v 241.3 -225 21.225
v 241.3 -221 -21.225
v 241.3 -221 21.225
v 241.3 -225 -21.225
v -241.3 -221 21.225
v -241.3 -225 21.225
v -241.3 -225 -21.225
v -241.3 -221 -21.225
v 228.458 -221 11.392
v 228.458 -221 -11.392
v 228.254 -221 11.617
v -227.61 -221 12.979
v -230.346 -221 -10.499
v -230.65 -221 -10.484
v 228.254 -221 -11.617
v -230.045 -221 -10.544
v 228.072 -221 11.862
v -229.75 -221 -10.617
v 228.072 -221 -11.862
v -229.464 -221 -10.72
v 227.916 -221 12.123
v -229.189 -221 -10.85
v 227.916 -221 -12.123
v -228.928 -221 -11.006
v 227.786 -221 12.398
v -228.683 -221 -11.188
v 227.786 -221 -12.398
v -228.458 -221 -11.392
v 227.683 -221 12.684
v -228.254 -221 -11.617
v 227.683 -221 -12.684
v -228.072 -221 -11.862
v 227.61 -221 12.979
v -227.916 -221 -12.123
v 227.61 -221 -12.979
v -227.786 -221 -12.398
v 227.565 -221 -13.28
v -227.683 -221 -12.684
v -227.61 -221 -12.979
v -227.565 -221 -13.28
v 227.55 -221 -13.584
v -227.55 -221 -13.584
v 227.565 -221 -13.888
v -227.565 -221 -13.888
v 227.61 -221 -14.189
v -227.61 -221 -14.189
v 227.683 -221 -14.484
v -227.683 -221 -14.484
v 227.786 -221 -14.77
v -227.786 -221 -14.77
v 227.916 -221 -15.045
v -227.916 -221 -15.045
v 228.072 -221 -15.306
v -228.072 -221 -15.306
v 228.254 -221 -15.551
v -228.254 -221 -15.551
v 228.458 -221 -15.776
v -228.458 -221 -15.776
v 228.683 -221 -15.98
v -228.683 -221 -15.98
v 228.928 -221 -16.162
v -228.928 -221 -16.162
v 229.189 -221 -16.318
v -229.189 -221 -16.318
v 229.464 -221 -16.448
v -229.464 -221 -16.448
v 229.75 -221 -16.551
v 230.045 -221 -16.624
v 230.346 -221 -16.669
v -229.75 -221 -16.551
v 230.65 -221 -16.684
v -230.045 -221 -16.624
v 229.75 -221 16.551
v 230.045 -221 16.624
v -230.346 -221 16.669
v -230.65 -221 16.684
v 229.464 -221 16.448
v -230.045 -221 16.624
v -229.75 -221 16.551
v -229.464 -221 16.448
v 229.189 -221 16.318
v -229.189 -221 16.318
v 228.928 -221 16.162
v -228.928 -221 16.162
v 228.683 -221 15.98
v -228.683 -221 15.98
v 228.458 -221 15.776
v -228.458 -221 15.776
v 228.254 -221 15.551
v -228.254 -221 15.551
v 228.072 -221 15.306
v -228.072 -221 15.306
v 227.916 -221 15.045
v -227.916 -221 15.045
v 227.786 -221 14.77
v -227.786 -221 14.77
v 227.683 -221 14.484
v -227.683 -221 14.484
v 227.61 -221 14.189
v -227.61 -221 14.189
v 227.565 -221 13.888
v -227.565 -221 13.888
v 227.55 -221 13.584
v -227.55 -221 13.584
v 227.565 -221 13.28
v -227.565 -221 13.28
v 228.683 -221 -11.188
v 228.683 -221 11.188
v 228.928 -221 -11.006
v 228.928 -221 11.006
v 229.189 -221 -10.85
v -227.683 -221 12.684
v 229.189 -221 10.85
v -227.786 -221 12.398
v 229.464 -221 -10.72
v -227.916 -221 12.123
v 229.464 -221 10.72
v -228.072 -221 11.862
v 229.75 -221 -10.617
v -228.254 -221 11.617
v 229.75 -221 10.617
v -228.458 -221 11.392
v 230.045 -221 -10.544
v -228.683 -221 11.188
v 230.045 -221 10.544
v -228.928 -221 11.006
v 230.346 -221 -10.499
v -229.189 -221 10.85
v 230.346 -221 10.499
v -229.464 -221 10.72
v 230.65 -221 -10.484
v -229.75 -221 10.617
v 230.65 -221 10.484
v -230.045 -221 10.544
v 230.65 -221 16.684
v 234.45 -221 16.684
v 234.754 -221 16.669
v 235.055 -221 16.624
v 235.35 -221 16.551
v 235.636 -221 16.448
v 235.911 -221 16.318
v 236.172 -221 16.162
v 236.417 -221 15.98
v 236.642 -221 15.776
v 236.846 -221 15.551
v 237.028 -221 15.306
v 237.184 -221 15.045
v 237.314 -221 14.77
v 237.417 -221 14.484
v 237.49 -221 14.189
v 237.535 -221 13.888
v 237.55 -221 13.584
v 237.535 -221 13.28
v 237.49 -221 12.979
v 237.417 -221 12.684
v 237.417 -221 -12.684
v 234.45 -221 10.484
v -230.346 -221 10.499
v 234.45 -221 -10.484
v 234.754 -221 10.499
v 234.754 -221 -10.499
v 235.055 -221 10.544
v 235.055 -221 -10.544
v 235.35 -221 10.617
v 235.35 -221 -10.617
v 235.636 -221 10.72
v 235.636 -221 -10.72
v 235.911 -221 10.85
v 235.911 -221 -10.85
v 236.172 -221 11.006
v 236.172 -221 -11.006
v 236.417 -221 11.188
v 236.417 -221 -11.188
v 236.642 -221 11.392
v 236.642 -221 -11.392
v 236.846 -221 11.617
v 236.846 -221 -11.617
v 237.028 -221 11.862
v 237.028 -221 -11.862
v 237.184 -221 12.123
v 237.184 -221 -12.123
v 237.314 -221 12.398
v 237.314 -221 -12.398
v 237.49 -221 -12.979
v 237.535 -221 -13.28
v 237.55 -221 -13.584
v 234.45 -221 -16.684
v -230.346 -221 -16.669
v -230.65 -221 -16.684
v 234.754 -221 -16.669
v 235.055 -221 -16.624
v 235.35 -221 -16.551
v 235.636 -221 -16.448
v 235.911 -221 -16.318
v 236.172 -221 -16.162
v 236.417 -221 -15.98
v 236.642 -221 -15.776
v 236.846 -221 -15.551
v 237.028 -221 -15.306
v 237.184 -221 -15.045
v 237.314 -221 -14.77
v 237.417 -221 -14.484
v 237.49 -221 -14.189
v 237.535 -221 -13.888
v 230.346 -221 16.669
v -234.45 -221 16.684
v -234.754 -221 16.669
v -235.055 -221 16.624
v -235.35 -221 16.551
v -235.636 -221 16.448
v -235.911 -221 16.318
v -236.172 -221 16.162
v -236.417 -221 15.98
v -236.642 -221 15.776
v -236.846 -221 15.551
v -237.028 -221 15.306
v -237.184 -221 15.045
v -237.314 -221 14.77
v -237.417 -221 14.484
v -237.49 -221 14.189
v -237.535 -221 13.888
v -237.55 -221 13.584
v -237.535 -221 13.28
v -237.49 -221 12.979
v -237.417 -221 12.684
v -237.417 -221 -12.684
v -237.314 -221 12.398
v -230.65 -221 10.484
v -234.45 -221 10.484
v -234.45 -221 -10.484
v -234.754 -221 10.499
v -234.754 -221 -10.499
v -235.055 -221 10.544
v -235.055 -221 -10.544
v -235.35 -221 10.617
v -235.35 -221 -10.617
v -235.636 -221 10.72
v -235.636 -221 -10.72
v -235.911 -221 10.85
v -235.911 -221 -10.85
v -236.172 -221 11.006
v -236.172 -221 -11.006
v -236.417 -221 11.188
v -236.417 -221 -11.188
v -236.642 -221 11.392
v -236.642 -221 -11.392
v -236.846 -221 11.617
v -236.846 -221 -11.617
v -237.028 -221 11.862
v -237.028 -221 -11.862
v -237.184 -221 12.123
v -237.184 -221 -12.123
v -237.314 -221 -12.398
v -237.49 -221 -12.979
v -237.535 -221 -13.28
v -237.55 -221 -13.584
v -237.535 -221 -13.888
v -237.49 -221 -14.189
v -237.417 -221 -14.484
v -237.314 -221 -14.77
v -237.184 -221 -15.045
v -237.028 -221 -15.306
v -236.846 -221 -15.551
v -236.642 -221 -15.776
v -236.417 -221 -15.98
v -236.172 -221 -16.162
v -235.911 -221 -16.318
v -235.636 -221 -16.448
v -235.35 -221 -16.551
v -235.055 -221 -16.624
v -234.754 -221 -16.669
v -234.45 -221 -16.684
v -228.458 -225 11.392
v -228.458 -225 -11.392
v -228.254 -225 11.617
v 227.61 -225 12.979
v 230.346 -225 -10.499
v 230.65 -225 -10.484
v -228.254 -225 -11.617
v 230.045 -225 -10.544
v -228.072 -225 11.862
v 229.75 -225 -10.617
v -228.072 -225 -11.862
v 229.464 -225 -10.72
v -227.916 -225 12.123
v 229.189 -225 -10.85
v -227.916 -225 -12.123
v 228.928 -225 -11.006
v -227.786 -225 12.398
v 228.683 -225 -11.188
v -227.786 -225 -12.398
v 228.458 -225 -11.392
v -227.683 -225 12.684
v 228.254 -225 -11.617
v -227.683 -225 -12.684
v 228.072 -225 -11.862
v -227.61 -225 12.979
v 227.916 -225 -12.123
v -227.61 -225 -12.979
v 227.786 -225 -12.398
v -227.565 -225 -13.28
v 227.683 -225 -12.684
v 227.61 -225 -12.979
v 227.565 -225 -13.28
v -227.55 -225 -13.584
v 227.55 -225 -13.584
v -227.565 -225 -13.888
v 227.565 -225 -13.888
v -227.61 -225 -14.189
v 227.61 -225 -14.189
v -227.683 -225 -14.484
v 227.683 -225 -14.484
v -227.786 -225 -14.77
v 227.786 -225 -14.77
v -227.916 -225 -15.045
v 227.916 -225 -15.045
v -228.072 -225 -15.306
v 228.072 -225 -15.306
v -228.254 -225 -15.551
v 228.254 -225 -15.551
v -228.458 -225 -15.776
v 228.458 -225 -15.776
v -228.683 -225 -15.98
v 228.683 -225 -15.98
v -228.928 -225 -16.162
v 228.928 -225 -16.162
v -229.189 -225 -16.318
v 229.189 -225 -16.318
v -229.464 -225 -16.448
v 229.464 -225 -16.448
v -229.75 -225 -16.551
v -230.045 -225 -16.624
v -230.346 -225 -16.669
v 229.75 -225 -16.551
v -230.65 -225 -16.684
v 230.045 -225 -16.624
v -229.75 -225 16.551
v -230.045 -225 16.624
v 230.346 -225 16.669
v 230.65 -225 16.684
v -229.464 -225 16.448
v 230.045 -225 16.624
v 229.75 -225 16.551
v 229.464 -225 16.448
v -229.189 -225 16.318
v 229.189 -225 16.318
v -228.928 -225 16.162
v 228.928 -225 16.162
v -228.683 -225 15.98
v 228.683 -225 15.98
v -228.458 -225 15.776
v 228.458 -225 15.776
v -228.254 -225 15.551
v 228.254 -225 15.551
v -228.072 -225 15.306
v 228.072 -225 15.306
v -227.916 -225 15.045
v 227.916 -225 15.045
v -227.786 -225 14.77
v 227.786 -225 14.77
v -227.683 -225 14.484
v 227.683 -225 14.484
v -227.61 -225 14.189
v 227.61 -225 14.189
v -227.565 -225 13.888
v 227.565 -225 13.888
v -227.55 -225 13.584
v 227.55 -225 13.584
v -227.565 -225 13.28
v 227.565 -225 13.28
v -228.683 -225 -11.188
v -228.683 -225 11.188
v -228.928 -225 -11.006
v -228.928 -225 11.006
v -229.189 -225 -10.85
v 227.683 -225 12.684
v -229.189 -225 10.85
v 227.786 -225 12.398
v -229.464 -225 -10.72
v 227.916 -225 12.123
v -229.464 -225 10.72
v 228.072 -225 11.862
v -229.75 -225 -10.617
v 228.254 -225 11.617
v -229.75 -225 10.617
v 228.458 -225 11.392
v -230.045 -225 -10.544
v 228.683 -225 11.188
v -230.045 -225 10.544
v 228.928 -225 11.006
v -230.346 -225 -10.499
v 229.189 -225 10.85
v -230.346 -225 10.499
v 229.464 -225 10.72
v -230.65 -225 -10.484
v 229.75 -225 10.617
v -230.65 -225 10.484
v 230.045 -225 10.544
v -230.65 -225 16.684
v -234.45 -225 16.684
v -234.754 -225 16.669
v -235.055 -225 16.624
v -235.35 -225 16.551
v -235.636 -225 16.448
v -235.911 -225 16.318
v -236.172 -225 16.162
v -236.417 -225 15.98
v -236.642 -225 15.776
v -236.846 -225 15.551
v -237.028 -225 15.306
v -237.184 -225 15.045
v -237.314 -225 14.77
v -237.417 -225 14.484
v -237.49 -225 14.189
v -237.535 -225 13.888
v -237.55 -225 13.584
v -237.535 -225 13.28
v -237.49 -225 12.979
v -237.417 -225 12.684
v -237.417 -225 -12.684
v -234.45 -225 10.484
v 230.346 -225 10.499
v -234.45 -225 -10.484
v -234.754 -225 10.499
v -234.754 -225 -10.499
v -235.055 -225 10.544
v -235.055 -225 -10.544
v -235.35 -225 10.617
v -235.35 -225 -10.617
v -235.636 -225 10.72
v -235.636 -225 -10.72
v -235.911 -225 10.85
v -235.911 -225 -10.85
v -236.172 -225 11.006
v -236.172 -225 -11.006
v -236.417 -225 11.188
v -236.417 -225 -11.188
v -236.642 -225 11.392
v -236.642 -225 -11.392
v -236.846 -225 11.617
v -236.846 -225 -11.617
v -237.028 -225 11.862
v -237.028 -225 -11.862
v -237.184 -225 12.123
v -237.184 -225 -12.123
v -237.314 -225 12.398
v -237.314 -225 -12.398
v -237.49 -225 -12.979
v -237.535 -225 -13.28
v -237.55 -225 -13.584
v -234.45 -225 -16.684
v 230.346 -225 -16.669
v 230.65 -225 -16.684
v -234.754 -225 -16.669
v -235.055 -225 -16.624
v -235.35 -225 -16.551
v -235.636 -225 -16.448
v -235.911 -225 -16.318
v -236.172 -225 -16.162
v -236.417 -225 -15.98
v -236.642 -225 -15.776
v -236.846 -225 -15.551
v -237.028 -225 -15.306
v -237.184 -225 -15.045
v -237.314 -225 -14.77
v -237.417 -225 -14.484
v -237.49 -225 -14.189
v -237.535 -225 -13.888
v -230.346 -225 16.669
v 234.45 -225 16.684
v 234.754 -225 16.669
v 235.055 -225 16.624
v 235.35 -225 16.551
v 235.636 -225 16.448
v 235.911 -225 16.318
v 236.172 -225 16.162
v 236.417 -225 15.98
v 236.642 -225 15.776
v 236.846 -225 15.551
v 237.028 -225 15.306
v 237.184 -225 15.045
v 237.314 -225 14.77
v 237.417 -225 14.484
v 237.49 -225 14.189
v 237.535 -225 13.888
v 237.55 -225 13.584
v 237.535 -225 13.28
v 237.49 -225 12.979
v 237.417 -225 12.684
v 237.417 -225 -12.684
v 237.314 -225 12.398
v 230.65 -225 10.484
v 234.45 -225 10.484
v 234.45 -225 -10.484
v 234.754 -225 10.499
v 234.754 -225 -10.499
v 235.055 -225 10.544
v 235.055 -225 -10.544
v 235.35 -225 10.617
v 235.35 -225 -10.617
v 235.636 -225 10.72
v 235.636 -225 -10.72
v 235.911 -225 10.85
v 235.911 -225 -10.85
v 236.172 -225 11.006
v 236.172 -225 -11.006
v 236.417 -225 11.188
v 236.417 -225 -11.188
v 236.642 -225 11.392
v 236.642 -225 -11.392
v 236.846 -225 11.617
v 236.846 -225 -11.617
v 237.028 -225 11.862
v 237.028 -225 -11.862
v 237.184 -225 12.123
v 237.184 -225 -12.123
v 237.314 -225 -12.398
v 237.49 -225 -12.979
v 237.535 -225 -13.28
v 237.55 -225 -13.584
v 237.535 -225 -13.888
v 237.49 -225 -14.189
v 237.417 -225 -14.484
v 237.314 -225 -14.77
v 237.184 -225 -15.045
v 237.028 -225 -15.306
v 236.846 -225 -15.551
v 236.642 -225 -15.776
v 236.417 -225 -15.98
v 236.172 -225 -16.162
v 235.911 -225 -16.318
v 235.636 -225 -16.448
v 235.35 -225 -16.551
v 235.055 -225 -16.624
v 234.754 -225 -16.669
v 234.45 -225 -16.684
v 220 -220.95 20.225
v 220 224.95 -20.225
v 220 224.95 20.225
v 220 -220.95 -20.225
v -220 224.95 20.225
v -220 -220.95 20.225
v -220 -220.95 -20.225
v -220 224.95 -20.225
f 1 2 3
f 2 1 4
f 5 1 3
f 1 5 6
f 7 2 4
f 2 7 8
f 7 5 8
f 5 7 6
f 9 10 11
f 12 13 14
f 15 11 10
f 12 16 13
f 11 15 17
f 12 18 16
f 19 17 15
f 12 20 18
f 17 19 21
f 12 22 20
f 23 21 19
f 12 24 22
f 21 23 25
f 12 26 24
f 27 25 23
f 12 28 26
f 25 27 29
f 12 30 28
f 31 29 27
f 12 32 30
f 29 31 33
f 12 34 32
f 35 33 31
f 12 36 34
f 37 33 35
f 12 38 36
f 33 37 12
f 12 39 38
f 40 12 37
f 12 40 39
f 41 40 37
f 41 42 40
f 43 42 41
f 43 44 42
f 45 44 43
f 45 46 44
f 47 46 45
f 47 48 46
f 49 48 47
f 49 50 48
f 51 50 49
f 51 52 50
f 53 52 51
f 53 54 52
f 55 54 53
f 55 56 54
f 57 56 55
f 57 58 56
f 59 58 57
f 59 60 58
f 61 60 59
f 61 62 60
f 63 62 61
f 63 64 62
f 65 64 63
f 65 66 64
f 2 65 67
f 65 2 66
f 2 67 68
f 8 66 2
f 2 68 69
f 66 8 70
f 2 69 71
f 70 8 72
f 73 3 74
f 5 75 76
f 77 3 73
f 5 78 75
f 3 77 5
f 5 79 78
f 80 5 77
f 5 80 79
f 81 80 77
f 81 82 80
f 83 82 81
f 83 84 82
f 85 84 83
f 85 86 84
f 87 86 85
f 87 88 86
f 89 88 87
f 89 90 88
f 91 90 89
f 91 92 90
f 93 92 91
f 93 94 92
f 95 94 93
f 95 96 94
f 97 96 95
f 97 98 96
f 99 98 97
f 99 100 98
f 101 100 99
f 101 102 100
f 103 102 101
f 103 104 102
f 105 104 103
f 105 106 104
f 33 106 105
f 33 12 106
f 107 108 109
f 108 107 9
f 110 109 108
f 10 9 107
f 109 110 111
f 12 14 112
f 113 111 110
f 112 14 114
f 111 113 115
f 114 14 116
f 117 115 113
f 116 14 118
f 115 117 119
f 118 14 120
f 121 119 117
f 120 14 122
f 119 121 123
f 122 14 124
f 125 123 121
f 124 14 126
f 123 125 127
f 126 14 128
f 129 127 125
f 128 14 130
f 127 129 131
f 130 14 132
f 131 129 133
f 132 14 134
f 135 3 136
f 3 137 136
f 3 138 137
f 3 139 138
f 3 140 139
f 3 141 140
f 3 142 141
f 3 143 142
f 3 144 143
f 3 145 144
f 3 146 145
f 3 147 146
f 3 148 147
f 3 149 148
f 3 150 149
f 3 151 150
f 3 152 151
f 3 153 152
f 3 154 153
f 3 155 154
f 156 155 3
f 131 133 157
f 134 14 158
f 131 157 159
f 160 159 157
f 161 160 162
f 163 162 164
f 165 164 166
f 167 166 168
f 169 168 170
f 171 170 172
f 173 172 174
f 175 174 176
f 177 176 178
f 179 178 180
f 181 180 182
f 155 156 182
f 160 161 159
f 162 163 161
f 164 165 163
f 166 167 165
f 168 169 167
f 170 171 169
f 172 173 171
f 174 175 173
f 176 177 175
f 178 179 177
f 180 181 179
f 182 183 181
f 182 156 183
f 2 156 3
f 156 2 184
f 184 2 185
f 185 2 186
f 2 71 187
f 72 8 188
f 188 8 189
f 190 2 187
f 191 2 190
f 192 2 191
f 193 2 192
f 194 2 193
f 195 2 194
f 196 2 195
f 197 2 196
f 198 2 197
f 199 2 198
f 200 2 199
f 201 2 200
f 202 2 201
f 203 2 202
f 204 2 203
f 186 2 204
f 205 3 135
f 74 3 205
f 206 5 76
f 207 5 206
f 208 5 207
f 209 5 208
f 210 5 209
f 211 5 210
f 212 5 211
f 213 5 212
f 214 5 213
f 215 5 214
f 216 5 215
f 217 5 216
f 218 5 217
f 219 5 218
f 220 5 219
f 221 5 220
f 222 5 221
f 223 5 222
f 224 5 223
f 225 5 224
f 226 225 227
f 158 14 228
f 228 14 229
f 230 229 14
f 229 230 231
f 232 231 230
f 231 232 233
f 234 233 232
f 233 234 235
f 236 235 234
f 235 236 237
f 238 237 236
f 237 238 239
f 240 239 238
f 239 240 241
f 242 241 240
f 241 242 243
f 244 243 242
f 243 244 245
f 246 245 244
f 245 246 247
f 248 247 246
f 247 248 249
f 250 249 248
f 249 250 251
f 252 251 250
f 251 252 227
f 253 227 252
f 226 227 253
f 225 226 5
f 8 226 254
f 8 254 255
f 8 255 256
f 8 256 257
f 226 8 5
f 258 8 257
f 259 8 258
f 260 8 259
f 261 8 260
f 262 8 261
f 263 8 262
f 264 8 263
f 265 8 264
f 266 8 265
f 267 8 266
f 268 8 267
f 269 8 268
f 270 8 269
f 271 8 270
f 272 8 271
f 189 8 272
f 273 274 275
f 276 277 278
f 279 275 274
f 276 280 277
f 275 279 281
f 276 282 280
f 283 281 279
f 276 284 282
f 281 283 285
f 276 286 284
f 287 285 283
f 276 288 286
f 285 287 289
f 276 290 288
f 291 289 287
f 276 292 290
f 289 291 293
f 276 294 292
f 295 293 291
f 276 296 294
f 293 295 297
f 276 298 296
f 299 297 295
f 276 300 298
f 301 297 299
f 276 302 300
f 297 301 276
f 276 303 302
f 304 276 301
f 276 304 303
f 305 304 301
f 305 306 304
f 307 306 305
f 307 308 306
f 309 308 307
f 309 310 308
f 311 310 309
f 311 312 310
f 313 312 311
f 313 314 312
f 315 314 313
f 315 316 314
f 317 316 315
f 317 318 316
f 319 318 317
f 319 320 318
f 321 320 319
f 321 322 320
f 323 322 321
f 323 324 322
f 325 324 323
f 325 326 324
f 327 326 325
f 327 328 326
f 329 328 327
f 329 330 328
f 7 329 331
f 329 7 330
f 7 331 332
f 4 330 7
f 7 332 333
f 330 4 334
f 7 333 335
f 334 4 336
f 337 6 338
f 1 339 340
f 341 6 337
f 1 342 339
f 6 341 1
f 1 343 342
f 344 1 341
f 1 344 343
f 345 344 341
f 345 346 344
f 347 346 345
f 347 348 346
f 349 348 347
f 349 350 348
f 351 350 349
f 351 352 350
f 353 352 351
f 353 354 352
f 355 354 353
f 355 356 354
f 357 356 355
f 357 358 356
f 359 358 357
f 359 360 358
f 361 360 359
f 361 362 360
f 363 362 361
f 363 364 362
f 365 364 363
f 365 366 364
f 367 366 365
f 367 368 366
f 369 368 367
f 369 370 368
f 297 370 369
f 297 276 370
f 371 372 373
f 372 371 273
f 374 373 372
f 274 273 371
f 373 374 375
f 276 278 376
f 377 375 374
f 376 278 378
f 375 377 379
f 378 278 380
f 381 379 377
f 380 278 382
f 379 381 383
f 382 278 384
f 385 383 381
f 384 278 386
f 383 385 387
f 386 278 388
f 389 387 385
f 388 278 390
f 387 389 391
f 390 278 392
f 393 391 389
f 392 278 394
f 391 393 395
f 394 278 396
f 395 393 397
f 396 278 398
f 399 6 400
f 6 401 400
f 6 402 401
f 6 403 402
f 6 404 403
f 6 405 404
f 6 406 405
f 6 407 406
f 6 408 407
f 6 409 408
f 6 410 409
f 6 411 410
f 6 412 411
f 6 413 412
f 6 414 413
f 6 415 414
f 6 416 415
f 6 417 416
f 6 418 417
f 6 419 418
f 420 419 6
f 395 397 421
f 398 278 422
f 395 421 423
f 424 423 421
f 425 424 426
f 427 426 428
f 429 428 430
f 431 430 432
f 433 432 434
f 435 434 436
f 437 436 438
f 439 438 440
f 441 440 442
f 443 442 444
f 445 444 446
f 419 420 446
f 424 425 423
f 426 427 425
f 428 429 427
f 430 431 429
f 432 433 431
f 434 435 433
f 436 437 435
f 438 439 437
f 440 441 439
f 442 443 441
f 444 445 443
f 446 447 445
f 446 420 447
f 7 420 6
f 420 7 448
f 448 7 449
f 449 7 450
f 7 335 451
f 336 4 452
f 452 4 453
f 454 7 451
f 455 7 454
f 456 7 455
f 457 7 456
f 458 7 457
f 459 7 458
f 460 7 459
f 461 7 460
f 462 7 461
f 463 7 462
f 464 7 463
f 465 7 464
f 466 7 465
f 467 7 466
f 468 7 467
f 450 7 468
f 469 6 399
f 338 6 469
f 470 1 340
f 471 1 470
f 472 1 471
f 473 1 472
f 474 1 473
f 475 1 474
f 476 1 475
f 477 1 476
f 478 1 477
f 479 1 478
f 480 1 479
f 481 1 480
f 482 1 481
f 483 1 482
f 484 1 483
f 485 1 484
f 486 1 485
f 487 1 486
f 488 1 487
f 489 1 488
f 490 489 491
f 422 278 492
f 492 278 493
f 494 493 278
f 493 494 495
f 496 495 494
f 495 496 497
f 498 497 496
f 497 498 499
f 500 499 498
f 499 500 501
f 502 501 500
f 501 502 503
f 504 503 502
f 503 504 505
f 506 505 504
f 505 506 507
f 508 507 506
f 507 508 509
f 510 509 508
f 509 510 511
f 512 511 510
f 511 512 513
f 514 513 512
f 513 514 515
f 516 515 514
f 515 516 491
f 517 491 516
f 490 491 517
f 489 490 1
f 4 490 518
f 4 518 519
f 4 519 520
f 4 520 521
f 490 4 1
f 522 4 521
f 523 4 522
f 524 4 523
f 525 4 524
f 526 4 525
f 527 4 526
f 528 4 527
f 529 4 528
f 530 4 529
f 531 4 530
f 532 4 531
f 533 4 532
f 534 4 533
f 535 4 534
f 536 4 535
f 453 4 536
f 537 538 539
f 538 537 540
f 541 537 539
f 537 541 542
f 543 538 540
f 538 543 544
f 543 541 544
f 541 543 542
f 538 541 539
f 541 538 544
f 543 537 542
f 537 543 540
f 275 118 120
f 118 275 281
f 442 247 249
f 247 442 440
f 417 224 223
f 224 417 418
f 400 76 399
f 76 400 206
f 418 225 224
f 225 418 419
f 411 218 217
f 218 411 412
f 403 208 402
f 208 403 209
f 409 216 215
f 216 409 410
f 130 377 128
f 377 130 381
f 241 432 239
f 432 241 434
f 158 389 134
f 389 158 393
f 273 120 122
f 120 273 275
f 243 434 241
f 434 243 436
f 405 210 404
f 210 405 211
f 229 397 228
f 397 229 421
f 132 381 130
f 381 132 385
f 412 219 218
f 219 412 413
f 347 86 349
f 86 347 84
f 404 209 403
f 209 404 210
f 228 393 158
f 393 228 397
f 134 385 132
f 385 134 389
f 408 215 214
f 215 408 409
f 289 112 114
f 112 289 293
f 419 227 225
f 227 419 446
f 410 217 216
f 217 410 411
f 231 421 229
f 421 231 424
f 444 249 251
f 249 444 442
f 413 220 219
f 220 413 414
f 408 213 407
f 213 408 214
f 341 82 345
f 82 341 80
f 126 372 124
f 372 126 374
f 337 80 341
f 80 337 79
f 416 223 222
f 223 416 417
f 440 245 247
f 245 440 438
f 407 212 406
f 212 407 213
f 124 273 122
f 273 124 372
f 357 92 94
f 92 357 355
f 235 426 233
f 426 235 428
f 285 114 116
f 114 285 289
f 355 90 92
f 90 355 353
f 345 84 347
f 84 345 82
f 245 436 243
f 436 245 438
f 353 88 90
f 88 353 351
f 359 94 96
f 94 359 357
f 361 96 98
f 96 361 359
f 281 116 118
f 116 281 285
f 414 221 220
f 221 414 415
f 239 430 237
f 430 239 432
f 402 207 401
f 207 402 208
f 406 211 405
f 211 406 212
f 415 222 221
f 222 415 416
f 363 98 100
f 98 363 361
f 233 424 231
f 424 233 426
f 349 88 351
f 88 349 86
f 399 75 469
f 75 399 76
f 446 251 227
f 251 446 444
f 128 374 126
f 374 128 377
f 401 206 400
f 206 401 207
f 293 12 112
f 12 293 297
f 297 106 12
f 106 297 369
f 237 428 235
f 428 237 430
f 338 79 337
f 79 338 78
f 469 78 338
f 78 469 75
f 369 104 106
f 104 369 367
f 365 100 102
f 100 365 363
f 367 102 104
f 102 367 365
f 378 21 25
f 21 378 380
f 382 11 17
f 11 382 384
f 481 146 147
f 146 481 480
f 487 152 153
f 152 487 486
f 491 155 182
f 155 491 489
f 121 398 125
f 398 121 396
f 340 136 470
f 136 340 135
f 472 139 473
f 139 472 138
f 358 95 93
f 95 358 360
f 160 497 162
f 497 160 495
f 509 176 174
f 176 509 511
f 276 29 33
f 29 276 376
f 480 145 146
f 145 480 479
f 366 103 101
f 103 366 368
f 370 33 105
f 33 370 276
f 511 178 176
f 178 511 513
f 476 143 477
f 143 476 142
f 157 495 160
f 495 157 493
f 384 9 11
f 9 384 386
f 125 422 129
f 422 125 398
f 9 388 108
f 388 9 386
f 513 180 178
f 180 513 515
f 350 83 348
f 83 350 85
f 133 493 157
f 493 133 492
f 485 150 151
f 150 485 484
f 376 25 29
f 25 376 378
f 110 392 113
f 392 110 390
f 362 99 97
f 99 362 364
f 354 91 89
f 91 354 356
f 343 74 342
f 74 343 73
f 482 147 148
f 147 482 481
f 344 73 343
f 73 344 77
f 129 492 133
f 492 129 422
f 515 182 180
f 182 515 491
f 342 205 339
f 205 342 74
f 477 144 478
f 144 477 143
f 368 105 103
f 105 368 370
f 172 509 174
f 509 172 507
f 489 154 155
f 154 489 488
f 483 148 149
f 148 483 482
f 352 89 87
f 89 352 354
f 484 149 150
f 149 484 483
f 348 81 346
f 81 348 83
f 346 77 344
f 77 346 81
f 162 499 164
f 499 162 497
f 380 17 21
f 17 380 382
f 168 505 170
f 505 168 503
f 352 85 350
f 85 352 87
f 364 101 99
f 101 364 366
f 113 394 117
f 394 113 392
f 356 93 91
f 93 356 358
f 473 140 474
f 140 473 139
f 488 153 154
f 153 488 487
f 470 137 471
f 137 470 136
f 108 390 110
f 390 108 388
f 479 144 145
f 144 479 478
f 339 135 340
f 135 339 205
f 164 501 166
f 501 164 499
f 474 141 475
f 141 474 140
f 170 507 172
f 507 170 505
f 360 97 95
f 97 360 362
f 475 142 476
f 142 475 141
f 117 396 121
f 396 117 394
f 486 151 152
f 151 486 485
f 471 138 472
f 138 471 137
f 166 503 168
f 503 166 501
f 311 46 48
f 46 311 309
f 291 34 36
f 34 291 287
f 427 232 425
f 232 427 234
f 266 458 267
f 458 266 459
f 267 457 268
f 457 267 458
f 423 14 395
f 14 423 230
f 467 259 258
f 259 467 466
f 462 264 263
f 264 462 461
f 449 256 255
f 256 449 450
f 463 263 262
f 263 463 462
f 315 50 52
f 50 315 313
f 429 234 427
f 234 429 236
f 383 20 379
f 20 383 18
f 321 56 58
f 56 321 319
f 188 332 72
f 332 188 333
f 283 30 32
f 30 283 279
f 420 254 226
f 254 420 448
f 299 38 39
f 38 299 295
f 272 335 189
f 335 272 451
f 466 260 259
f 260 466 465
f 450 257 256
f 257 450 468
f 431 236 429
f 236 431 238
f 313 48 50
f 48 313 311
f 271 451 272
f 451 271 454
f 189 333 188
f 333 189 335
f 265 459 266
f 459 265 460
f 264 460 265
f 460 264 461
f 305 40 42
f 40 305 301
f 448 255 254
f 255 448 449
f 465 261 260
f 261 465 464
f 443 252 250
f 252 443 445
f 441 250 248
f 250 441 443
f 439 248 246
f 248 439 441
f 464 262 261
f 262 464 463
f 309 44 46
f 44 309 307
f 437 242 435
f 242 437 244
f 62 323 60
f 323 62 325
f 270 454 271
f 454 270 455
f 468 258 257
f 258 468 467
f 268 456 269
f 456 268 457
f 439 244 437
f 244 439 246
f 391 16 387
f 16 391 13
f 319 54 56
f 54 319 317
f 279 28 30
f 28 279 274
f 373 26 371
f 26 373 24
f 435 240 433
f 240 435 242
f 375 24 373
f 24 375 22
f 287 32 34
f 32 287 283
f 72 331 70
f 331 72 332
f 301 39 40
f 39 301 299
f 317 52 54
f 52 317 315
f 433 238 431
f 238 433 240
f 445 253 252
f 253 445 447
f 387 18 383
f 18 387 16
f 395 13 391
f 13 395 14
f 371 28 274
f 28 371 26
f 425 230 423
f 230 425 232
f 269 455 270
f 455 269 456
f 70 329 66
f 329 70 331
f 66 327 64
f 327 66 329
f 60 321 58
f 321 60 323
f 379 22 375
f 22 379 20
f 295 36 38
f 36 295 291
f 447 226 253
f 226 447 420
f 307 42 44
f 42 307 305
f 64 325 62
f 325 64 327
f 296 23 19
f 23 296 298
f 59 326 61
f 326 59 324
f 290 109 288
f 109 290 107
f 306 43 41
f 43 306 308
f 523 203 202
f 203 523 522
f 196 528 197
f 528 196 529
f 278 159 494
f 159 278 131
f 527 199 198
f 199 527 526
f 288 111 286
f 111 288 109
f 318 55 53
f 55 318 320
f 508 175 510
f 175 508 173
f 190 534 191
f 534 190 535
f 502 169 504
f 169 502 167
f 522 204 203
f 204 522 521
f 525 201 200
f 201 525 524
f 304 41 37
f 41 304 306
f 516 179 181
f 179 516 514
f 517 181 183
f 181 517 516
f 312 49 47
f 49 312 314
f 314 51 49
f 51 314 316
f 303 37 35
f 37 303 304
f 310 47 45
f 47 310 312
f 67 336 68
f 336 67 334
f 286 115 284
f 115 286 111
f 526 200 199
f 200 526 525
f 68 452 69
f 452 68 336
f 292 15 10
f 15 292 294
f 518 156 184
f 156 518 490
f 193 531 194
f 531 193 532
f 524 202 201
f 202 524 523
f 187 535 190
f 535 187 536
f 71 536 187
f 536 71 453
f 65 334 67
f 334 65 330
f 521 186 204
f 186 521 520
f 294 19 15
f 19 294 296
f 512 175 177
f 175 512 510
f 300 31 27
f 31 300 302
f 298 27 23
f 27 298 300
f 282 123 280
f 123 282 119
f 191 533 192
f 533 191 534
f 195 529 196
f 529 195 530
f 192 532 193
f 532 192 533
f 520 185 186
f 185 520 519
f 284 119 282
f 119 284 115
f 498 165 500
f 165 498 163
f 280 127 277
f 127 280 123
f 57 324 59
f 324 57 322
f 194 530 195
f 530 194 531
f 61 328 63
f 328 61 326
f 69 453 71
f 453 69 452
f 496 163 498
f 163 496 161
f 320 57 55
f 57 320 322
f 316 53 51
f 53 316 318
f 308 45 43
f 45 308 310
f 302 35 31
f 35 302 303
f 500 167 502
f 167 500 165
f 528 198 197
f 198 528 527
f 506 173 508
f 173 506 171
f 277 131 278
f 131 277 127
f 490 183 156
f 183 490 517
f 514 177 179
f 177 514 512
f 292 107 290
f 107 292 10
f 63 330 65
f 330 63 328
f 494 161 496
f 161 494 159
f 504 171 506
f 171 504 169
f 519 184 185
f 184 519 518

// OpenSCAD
// ============================================================================
// Atom Lithography Machine — Parametric OpenSCAD Module (S7.4-01)
// ============================================================================
// part_id           : S7.4-01
// parent_bom_id     : S7.4
// subsystem         : S7
// part_name         : 10 MHz Rubidyum atomik saat referansi ve dusuk-jitter saat dagiticisi
// material          : Steel
// temp_stage        : 300 K (kabin)
// vacuum_grade      : Atmosfer
// tolerance         : ±5e-11
// computed_mass_kg  : 11.50000
// envelope_mm       : 482.600 x 473.300 x 42.450
// design_maturity   : M0_M1_DETAILED_CAD_DESIGN_ONLY
// no_lab_measurement: true
// iec61508_certified: false
// semi_s2_certified : false
// Units: millimeters (mm)
// ============================================================================

$fn = 64;

// Nominal bounding envelope parameters (mm)
bbox_x = 482.6000;
bbox_y = 473.3000;
bbox_z = 42.4500;

// Part-specific parametric dimensions
u_start = 36;
u_count = 1;
bnc_outputs = 16;
depth_mm = 450.0;

// Interface / port parameters (mm)

module part_S7_4_01() {
  difference() {
    union() {
      // 19-inch EIA-310 front faceplate
      translate([0.000, -223.000, 0.000]) cube([482.600, 4.000, 42.450], center=true);
      // Main rack chassis enclosure
      translate([0.000, 2.000, 0.000]) cube([440.000, 445.900, 40.450], center=true);
    }
    // EIA-310 rack ear mounting slot (top-left)
    translate([-232.550, -223.000, 13.584]) rotate([90.000, 0.000, 0.000]) {
      hull() {
        translate([-1.900, 0, 0]) cylinder(d=6.200, h=8.000, center=true);
        translate([1.900, 0, 0]) cylinder(d=6.200, h=8.000, center=true);
      }
    }
    // EIA-310 rack ear mounting slot (top-right)
    translate([232.550, -223.000, 13.584]) rotate([90.000, 0.000, 0.000]) {
      hull() {
        translate([-1.900, 0, 0]) cylinder(d=6.200, h=8.000, center=true);
        translate([1.900, 0, 0]) cylinder(d=6.200, h=8.000, center=true);
      }
    }
    // EIA-310 rack ear mounting slot (bottom-left)
    translate([-232.550, -223.000, -13.584]) rotate([90.000, 0.000, 0.000]) {
      hull() {
        translate([-1.900, 0, 0]) cylinder(d=6.200, h=8.000, center=true);
        translate([1.900, 0, 0]) cylinder(d=6.200, h=8.000, center=true);
      }
    }
    // EIA-310 rack ear mounting slot (bottom-right)
    translate([232.550, -223.000, -13.584]) rotate([90.000, 0.000, 0.000]) {
      hull() {
        translate([-1.900, 0, 0]) cylinder(d=6.200, h=8.000, center=true);
        translate([1.900, 0, 0]) cylinder(d=6.200, h=8.000, center=true);
      }
    }
  }
}

// World assembly mounting transform (global machine frame, mm / deg):
// translate([1480.000, -213.000, 1667.975]) rotate([0.000, 0.000, 0.000]) part_S7_4_01();

part_S7_4_01();
